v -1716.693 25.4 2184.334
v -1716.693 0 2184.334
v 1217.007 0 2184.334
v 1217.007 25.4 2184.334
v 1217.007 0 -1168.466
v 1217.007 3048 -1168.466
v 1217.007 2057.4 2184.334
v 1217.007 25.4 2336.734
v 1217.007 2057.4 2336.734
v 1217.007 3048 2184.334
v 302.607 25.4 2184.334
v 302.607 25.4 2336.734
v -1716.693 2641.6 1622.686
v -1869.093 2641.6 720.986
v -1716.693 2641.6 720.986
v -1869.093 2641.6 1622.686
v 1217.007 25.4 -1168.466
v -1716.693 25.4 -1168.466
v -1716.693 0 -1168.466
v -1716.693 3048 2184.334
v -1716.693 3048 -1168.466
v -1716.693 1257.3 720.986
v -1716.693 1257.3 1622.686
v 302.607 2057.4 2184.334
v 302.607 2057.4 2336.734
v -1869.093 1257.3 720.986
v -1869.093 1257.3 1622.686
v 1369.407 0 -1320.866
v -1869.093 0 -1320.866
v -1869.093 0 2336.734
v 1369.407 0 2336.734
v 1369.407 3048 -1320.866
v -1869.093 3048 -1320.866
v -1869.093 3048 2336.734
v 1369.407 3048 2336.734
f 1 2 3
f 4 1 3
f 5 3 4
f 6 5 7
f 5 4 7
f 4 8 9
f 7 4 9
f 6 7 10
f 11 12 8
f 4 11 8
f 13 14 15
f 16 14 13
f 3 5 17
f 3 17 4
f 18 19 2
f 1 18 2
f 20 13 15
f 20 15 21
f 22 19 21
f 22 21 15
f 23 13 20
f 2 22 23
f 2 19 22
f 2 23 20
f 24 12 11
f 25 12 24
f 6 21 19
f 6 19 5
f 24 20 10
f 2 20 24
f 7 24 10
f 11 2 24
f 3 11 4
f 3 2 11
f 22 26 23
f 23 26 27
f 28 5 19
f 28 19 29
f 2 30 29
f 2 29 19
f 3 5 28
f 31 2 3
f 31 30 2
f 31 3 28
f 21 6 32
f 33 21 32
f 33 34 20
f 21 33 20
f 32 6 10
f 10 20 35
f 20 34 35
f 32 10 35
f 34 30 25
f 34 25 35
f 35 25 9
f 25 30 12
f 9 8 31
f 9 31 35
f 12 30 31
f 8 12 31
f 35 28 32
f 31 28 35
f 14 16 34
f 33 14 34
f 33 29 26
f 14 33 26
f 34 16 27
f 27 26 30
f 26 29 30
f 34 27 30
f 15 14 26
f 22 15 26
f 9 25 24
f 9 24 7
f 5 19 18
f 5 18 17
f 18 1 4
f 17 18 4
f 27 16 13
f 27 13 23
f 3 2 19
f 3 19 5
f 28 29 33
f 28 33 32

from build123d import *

# Parameters (mm, degrees)
F0_W     = 2933.7
F0_H     = 3352.8
F1_DEPTH = 25.4
F0_W_2   = 3238.5
F0_H_2   = 3657.6
F2_DEPTH = 3048
F3_W     = 914.4
F3_H     = 2032
F4_DEPTH = 152.4
F5_W     = 1384.3
F5_H     = 901.7
F6_DEPTH = 152.4


with BuildPart() as f1:
    # F0 (on Front) → F1 (new body)
    with BuildSketch(Plane.XZ):
        with Locations((-249.842785, 507.934408)):
            Rectangle(F0_W, F0_H)
    extrude(amount=-F1_DEPTH)


with BuildPart() as f2:
    # F0 (on Front) → F2 (new body)
    with BuildSketch(Plane.XZ):
        with Locations((-249.842785, 507.934408)):
            Rectangle(F0_W_2, F0_H_2)
        with Locations((-249.842785, 507.934408)):
            Rectangle(F0_W, F0_H, mode=Mode.SUBTRACT)
    extrude(amount=-F2_DEPTH)

    # F3 (on face) → F4 (cut, through all)
    with BuildSketch(Plane.XY.offset(2336.734408)):
        with Locations((759.807215, 1041.4)):
            Rectangle(F3_W, F3_H)
    extrude(amount=-F4_DEPTH, mode=Mode.SUBTRACT)

    # F5 (on face) → F6 (cut, through all)
    with BuildSketch(Plane(origin=(-1869.092785, 0, 0), x_dir=(0, -1, 0), z_dir=(-1, 0, 0))):
        with Locations((-1949.45, 1171.835959)):
            Rectangle(F5_W, F5_H)
    extrude(amount=-F6_DEPTH, mode=Mode.SUBTRACT)


solid = Compound([f1.part, f2.part])
